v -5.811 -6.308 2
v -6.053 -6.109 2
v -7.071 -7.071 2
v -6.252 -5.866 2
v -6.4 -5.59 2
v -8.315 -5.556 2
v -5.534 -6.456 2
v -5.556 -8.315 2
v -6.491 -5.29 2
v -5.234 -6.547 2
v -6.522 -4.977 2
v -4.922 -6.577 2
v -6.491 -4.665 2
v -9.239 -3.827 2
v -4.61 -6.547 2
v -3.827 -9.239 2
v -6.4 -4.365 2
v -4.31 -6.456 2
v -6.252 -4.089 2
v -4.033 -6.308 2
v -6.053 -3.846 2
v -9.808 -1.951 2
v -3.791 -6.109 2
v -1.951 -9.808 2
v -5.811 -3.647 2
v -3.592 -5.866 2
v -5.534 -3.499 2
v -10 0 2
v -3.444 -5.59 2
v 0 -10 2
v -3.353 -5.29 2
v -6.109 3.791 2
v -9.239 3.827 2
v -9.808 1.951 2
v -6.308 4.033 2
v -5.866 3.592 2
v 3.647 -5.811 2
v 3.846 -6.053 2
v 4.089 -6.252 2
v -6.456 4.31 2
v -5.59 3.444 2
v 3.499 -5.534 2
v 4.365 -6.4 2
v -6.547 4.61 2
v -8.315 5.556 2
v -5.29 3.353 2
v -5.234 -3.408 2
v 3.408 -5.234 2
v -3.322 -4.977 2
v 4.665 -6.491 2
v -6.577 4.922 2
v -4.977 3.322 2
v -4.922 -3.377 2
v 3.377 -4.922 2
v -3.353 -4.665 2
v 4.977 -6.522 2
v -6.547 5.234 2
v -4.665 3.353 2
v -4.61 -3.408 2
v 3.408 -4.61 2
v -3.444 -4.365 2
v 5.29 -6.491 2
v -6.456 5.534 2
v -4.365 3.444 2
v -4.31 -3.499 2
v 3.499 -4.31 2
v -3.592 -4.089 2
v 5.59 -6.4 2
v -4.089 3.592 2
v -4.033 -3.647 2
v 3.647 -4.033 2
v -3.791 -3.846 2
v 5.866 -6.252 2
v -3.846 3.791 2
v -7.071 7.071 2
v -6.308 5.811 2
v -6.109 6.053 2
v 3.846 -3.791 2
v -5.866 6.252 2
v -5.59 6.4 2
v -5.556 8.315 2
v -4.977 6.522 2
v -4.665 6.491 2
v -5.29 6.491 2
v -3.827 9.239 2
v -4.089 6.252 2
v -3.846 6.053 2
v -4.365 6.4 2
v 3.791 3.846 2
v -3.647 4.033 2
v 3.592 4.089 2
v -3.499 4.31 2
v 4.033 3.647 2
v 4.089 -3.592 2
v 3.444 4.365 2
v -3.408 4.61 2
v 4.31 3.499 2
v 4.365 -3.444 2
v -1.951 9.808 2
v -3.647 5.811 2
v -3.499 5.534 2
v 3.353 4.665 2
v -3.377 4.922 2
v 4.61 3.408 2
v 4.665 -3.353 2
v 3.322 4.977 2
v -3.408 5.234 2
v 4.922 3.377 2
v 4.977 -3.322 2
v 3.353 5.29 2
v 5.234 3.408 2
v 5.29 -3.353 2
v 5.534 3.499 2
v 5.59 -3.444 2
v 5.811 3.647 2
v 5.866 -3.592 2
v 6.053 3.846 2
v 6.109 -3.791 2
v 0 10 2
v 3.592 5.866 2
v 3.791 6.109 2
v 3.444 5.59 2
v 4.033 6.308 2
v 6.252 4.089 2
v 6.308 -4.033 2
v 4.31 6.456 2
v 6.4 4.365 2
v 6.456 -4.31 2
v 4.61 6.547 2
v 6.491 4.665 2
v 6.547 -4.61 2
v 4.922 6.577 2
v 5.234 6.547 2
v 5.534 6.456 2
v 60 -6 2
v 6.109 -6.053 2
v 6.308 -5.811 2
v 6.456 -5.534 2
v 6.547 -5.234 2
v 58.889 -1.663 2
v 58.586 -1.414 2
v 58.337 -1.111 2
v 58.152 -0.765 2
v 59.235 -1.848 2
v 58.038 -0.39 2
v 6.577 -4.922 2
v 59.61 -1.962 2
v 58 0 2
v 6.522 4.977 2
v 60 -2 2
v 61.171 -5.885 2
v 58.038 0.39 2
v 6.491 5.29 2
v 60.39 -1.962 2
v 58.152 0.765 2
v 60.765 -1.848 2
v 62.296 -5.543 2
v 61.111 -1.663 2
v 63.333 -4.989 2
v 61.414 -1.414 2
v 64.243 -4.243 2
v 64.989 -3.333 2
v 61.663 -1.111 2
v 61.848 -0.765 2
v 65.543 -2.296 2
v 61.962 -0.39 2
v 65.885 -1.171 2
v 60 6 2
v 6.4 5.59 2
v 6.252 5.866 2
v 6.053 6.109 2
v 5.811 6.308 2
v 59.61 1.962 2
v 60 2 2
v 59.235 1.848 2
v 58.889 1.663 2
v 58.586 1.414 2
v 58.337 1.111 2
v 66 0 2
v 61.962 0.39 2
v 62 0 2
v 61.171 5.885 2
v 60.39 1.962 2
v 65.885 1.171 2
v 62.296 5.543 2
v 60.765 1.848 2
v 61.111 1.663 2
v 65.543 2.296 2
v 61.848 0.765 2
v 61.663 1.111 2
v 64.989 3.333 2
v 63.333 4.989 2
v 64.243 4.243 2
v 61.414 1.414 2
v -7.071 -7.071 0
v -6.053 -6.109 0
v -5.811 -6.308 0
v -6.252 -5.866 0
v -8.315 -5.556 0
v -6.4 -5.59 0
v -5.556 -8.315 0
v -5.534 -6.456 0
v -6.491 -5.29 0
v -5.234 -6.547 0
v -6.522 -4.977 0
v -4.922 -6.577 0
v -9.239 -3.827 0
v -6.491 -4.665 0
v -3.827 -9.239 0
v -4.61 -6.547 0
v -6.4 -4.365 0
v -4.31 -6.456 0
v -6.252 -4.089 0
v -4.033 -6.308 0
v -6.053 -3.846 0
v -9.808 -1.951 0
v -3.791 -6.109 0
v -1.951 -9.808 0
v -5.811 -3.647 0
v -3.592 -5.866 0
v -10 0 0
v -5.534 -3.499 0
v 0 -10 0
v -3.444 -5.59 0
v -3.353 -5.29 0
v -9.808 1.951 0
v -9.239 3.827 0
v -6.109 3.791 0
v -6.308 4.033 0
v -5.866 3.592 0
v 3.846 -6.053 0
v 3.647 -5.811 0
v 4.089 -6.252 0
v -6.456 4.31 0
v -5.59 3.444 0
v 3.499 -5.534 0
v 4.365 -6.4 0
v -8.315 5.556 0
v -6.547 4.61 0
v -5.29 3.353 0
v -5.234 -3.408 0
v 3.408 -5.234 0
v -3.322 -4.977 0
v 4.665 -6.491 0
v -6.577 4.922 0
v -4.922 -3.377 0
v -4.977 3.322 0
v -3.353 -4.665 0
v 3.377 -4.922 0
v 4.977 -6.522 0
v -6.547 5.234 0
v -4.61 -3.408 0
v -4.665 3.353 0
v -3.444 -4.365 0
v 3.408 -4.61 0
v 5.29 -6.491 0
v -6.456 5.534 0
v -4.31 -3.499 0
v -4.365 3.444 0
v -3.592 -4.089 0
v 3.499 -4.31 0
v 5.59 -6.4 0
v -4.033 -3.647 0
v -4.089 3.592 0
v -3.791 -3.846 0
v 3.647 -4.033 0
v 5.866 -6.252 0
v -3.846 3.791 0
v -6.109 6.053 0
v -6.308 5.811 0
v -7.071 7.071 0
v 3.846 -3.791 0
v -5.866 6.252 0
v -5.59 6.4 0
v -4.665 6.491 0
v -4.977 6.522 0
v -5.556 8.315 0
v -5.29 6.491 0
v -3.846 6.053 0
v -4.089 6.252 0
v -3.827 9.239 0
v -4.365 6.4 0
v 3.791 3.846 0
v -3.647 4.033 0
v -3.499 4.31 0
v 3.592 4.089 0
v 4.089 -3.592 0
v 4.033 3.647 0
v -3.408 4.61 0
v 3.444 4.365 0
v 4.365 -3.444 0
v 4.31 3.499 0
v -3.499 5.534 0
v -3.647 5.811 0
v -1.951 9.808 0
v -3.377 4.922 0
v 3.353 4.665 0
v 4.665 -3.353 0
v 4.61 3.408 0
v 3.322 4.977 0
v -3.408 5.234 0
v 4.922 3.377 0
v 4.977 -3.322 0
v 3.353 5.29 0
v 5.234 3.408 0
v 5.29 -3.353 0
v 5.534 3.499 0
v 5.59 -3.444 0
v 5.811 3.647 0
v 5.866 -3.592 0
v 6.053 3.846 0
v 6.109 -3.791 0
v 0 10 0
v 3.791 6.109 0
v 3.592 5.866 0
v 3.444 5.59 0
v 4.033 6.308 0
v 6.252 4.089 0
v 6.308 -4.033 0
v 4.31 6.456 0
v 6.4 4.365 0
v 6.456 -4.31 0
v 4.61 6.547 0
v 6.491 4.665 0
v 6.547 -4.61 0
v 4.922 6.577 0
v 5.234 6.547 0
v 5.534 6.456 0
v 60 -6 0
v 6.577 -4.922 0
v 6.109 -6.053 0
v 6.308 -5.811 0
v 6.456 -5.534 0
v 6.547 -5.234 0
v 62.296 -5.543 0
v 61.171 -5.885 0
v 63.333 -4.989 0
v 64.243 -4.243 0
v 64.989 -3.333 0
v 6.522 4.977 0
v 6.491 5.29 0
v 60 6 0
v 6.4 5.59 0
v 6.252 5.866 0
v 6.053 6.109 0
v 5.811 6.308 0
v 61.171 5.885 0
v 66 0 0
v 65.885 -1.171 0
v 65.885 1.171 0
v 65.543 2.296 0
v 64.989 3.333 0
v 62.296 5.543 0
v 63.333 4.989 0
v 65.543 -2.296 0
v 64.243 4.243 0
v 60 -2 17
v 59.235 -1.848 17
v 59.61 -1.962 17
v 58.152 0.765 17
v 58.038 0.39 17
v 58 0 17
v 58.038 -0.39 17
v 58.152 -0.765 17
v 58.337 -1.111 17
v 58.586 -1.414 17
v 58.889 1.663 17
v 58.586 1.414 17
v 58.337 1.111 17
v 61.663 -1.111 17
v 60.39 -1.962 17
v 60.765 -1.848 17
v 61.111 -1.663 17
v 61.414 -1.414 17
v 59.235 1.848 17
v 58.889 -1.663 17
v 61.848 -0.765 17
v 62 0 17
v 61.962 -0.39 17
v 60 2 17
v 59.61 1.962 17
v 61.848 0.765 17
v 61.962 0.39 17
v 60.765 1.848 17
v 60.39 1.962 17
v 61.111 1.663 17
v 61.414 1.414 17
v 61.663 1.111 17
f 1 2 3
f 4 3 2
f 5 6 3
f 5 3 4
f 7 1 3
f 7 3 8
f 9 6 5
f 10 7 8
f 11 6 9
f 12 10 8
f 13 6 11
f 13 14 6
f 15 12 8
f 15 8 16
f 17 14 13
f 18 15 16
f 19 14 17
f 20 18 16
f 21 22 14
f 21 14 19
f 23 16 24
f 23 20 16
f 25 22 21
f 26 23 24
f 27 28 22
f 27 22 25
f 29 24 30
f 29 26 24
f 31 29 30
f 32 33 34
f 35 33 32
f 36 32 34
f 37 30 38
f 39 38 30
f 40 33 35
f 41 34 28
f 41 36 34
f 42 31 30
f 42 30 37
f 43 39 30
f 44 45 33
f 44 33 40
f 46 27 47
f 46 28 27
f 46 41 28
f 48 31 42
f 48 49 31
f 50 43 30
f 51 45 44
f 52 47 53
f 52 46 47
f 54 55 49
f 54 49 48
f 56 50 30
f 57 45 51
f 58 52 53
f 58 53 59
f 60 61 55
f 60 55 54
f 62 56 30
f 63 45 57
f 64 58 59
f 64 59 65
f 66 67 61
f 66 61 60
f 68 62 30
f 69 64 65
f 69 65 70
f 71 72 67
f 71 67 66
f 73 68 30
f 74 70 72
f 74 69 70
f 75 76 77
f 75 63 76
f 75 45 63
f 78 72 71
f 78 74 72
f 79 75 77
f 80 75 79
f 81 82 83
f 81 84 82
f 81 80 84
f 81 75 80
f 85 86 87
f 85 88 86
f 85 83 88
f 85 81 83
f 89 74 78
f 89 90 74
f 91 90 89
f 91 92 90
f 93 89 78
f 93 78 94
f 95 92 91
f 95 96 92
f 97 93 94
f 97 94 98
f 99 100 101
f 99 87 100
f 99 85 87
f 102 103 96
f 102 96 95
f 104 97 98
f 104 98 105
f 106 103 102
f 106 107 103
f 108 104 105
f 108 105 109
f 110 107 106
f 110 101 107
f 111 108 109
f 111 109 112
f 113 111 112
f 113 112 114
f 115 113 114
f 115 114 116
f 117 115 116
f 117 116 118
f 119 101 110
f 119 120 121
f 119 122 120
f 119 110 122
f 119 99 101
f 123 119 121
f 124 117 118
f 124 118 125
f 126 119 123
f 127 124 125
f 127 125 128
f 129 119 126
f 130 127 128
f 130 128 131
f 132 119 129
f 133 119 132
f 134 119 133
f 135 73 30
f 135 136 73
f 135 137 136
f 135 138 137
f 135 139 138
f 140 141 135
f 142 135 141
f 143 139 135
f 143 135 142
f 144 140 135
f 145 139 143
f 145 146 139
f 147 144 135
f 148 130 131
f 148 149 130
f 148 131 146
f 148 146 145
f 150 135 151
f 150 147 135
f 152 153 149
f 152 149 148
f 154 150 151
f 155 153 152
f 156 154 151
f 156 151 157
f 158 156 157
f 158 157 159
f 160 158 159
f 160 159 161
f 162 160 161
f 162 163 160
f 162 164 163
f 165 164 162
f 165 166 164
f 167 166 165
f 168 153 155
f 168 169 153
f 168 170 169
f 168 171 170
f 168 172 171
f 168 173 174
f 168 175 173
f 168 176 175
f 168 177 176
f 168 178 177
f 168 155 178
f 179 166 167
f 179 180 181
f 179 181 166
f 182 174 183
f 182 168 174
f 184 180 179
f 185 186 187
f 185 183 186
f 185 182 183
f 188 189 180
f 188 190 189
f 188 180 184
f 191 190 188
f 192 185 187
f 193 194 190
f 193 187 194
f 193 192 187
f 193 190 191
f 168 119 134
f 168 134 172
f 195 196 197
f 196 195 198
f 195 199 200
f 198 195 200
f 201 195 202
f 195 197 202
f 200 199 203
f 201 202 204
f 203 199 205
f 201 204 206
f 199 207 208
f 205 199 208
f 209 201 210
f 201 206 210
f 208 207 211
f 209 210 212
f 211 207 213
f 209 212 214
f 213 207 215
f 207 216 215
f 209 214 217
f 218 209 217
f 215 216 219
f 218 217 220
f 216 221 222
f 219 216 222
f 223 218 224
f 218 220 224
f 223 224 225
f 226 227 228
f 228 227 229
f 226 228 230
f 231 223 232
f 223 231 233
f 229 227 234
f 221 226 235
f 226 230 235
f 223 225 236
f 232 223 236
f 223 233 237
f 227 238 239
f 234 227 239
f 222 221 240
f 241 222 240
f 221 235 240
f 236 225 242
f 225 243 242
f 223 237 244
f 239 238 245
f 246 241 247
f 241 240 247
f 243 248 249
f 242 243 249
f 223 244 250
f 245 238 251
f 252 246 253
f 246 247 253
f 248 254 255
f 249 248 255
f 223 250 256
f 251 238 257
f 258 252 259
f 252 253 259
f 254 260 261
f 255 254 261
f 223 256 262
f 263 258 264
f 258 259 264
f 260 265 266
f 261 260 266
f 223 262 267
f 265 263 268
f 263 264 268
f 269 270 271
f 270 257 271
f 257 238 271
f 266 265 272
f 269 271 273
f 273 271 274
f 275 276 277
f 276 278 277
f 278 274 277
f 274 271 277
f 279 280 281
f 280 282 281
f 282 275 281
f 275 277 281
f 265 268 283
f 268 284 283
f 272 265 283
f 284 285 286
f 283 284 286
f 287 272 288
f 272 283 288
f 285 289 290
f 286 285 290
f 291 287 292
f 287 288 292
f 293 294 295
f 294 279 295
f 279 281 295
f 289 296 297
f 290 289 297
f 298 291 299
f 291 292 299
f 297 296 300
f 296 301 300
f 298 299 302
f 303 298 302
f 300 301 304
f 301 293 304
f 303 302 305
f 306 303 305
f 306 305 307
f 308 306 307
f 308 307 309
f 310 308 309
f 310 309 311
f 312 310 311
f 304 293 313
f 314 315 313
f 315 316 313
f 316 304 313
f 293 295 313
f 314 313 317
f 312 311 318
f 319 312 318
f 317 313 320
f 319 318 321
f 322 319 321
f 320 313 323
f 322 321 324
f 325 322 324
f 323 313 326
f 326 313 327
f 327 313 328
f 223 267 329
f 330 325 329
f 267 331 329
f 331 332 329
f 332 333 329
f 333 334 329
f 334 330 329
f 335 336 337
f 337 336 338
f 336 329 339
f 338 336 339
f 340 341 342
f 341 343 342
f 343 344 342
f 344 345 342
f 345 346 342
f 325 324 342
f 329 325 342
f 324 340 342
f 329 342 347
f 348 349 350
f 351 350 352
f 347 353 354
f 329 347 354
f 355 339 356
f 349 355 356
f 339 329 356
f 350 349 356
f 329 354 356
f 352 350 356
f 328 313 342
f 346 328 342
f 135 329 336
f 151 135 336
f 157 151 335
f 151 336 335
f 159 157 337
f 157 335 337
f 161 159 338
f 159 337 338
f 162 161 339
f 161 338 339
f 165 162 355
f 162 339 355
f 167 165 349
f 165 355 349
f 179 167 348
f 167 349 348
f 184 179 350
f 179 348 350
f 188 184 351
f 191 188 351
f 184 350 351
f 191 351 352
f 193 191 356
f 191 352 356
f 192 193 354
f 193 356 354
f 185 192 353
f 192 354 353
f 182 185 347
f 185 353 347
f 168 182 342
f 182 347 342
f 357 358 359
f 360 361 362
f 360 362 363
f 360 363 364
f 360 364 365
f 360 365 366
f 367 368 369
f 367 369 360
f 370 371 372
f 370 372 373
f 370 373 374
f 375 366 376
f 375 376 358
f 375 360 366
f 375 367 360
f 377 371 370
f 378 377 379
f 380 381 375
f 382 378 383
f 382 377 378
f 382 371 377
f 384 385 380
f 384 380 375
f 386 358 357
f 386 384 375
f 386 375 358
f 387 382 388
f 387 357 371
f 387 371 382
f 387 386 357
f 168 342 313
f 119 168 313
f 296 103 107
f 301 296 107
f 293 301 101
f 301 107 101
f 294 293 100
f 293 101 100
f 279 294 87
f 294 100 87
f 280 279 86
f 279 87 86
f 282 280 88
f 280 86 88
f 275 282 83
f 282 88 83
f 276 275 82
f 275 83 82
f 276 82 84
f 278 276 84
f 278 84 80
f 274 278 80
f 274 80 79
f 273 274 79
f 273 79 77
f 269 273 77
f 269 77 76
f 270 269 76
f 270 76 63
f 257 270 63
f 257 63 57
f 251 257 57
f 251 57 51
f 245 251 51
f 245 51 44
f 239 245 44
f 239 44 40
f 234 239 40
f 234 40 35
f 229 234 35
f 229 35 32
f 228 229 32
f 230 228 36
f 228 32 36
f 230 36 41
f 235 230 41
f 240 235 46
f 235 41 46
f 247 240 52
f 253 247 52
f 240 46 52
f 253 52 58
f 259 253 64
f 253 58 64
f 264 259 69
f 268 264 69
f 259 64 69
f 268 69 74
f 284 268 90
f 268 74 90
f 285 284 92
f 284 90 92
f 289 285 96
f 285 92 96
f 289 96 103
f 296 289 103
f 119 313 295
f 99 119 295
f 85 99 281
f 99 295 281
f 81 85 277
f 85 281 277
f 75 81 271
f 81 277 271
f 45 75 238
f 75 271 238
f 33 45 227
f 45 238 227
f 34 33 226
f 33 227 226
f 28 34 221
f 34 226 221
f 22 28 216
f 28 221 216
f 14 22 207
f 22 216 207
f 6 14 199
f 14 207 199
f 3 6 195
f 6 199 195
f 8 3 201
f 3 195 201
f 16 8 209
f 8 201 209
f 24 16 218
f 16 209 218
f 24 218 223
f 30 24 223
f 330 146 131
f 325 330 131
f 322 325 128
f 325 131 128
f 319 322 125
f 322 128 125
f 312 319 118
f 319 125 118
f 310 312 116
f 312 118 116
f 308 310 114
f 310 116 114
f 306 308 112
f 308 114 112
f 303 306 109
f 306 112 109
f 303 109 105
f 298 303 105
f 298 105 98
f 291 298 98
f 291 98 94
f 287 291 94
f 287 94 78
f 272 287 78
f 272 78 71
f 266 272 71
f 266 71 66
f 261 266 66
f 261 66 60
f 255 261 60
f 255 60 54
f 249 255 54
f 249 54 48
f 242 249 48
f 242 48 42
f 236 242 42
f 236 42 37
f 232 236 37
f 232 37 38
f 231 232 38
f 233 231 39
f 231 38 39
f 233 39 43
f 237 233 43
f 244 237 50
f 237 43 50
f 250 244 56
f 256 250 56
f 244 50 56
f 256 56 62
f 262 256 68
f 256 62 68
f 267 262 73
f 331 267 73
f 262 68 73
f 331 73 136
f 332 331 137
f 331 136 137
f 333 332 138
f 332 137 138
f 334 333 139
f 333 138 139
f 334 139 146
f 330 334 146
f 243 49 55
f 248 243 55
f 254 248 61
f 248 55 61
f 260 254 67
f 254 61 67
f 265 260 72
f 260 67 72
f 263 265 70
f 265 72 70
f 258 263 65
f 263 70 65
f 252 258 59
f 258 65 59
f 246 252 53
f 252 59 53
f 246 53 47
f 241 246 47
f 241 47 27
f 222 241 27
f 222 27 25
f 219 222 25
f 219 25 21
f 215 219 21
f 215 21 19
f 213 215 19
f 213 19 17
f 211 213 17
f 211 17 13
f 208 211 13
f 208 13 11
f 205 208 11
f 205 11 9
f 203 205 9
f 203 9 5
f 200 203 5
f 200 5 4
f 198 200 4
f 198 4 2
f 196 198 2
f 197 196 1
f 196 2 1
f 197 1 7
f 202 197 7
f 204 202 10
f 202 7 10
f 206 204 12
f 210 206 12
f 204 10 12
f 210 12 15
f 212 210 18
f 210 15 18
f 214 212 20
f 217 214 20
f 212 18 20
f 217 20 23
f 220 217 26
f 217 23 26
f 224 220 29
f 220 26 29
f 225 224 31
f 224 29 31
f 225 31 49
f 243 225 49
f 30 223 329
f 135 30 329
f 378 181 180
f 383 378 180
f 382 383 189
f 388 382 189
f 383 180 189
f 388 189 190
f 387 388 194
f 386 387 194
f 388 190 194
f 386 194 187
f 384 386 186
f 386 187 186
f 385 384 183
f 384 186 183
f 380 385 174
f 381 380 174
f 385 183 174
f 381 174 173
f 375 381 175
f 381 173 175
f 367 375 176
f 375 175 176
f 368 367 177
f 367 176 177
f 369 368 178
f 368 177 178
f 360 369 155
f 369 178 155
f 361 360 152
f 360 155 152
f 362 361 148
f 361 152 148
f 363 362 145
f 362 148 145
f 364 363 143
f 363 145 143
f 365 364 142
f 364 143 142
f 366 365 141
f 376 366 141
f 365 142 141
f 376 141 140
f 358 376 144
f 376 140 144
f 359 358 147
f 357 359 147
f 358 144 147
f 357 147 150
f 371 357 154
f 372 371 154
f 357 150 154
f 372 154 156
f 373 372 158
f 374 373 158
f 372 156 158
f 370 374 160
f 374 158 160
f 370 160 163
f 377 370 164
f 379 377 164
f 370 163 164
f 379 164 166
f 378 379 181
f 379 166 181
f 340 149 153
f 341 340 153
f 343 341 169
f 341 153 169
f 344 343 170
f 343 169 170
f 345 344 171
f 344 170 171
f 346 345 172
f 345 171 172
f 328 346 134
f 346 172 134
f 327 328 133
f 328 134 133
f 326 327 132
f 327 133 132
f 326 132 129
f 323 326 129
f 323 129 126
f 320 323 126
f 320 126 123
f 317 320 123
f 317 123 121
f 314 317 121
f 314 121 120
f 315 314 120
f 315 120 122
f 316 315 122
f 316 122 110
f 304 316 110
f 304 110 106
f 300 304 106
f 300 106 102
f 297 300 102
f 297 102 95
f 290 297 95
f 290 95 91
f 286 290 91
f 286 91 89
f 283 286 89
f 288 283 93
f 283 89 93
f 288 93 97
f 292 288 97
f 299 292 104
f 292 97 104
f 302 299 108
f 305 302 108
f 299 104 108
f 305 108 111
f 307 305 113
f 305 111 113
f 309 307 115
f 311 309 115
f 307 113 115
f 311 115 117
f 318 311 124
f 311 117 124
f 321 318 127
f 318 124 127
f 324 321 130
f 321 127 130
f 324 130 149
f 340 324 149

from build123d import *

# Parameters (mm, degrees)
BOSS_EXTRUDE1_DEPTH = 2
SKETCH2_R           = 1.6
CUT_EXTRUDE1_DEPTH  = 10
SKETCH3_R           = 2
BOSS_EXTRUDE2_DEPTH = 15


with BuildPart() as part:
    # Sketch1 → Boss-Extrude1 (new body)
    with BuildSketch(Plane.XY):
        with BuildLine():
            ThreePointArc((0, 10), (-10, 0), (0, -10))
            Line((0, -10), (60, -6))
            ThreePointArc((60, -6), (66, 0), (60, 6))
            Line((60, 6), (0, 10))
        make_face()
    extrude(amount=BOSS_EXTRUDE1_DEPTH)

    # Sketch2 → Cut-Extrude1 (cut)
    with BuildSketch(Plane.XY.offset(2)):
        with Locations((-4.977412632, 4.921926807)):
            Circle(SKETCH2_R)
        with Locations((4.921926807, 4.977412632)):
            Circle(SKETCH2_R)
        with Locations((4.977412632, -4.921926807)):
            Circle(SKETCH2_R)
        with Locations((-4.921926807, -4.977412632)):
            Circle(SKETCH2_R)
    extrude(amount=-CUT_EXTRUDE1_DEPTH, mode=Mode.SUBTRACT)

    # Sketch3 → Boss-Extrude2 (add)
    with BuildSketch(Plane.XY.offset(2)):
        with Locations((60, 0)):
            Circle(SKETCH3_R)
    extrude(amount=BOSS_EXTRUDE2_DEPTH)


solid = part.part
